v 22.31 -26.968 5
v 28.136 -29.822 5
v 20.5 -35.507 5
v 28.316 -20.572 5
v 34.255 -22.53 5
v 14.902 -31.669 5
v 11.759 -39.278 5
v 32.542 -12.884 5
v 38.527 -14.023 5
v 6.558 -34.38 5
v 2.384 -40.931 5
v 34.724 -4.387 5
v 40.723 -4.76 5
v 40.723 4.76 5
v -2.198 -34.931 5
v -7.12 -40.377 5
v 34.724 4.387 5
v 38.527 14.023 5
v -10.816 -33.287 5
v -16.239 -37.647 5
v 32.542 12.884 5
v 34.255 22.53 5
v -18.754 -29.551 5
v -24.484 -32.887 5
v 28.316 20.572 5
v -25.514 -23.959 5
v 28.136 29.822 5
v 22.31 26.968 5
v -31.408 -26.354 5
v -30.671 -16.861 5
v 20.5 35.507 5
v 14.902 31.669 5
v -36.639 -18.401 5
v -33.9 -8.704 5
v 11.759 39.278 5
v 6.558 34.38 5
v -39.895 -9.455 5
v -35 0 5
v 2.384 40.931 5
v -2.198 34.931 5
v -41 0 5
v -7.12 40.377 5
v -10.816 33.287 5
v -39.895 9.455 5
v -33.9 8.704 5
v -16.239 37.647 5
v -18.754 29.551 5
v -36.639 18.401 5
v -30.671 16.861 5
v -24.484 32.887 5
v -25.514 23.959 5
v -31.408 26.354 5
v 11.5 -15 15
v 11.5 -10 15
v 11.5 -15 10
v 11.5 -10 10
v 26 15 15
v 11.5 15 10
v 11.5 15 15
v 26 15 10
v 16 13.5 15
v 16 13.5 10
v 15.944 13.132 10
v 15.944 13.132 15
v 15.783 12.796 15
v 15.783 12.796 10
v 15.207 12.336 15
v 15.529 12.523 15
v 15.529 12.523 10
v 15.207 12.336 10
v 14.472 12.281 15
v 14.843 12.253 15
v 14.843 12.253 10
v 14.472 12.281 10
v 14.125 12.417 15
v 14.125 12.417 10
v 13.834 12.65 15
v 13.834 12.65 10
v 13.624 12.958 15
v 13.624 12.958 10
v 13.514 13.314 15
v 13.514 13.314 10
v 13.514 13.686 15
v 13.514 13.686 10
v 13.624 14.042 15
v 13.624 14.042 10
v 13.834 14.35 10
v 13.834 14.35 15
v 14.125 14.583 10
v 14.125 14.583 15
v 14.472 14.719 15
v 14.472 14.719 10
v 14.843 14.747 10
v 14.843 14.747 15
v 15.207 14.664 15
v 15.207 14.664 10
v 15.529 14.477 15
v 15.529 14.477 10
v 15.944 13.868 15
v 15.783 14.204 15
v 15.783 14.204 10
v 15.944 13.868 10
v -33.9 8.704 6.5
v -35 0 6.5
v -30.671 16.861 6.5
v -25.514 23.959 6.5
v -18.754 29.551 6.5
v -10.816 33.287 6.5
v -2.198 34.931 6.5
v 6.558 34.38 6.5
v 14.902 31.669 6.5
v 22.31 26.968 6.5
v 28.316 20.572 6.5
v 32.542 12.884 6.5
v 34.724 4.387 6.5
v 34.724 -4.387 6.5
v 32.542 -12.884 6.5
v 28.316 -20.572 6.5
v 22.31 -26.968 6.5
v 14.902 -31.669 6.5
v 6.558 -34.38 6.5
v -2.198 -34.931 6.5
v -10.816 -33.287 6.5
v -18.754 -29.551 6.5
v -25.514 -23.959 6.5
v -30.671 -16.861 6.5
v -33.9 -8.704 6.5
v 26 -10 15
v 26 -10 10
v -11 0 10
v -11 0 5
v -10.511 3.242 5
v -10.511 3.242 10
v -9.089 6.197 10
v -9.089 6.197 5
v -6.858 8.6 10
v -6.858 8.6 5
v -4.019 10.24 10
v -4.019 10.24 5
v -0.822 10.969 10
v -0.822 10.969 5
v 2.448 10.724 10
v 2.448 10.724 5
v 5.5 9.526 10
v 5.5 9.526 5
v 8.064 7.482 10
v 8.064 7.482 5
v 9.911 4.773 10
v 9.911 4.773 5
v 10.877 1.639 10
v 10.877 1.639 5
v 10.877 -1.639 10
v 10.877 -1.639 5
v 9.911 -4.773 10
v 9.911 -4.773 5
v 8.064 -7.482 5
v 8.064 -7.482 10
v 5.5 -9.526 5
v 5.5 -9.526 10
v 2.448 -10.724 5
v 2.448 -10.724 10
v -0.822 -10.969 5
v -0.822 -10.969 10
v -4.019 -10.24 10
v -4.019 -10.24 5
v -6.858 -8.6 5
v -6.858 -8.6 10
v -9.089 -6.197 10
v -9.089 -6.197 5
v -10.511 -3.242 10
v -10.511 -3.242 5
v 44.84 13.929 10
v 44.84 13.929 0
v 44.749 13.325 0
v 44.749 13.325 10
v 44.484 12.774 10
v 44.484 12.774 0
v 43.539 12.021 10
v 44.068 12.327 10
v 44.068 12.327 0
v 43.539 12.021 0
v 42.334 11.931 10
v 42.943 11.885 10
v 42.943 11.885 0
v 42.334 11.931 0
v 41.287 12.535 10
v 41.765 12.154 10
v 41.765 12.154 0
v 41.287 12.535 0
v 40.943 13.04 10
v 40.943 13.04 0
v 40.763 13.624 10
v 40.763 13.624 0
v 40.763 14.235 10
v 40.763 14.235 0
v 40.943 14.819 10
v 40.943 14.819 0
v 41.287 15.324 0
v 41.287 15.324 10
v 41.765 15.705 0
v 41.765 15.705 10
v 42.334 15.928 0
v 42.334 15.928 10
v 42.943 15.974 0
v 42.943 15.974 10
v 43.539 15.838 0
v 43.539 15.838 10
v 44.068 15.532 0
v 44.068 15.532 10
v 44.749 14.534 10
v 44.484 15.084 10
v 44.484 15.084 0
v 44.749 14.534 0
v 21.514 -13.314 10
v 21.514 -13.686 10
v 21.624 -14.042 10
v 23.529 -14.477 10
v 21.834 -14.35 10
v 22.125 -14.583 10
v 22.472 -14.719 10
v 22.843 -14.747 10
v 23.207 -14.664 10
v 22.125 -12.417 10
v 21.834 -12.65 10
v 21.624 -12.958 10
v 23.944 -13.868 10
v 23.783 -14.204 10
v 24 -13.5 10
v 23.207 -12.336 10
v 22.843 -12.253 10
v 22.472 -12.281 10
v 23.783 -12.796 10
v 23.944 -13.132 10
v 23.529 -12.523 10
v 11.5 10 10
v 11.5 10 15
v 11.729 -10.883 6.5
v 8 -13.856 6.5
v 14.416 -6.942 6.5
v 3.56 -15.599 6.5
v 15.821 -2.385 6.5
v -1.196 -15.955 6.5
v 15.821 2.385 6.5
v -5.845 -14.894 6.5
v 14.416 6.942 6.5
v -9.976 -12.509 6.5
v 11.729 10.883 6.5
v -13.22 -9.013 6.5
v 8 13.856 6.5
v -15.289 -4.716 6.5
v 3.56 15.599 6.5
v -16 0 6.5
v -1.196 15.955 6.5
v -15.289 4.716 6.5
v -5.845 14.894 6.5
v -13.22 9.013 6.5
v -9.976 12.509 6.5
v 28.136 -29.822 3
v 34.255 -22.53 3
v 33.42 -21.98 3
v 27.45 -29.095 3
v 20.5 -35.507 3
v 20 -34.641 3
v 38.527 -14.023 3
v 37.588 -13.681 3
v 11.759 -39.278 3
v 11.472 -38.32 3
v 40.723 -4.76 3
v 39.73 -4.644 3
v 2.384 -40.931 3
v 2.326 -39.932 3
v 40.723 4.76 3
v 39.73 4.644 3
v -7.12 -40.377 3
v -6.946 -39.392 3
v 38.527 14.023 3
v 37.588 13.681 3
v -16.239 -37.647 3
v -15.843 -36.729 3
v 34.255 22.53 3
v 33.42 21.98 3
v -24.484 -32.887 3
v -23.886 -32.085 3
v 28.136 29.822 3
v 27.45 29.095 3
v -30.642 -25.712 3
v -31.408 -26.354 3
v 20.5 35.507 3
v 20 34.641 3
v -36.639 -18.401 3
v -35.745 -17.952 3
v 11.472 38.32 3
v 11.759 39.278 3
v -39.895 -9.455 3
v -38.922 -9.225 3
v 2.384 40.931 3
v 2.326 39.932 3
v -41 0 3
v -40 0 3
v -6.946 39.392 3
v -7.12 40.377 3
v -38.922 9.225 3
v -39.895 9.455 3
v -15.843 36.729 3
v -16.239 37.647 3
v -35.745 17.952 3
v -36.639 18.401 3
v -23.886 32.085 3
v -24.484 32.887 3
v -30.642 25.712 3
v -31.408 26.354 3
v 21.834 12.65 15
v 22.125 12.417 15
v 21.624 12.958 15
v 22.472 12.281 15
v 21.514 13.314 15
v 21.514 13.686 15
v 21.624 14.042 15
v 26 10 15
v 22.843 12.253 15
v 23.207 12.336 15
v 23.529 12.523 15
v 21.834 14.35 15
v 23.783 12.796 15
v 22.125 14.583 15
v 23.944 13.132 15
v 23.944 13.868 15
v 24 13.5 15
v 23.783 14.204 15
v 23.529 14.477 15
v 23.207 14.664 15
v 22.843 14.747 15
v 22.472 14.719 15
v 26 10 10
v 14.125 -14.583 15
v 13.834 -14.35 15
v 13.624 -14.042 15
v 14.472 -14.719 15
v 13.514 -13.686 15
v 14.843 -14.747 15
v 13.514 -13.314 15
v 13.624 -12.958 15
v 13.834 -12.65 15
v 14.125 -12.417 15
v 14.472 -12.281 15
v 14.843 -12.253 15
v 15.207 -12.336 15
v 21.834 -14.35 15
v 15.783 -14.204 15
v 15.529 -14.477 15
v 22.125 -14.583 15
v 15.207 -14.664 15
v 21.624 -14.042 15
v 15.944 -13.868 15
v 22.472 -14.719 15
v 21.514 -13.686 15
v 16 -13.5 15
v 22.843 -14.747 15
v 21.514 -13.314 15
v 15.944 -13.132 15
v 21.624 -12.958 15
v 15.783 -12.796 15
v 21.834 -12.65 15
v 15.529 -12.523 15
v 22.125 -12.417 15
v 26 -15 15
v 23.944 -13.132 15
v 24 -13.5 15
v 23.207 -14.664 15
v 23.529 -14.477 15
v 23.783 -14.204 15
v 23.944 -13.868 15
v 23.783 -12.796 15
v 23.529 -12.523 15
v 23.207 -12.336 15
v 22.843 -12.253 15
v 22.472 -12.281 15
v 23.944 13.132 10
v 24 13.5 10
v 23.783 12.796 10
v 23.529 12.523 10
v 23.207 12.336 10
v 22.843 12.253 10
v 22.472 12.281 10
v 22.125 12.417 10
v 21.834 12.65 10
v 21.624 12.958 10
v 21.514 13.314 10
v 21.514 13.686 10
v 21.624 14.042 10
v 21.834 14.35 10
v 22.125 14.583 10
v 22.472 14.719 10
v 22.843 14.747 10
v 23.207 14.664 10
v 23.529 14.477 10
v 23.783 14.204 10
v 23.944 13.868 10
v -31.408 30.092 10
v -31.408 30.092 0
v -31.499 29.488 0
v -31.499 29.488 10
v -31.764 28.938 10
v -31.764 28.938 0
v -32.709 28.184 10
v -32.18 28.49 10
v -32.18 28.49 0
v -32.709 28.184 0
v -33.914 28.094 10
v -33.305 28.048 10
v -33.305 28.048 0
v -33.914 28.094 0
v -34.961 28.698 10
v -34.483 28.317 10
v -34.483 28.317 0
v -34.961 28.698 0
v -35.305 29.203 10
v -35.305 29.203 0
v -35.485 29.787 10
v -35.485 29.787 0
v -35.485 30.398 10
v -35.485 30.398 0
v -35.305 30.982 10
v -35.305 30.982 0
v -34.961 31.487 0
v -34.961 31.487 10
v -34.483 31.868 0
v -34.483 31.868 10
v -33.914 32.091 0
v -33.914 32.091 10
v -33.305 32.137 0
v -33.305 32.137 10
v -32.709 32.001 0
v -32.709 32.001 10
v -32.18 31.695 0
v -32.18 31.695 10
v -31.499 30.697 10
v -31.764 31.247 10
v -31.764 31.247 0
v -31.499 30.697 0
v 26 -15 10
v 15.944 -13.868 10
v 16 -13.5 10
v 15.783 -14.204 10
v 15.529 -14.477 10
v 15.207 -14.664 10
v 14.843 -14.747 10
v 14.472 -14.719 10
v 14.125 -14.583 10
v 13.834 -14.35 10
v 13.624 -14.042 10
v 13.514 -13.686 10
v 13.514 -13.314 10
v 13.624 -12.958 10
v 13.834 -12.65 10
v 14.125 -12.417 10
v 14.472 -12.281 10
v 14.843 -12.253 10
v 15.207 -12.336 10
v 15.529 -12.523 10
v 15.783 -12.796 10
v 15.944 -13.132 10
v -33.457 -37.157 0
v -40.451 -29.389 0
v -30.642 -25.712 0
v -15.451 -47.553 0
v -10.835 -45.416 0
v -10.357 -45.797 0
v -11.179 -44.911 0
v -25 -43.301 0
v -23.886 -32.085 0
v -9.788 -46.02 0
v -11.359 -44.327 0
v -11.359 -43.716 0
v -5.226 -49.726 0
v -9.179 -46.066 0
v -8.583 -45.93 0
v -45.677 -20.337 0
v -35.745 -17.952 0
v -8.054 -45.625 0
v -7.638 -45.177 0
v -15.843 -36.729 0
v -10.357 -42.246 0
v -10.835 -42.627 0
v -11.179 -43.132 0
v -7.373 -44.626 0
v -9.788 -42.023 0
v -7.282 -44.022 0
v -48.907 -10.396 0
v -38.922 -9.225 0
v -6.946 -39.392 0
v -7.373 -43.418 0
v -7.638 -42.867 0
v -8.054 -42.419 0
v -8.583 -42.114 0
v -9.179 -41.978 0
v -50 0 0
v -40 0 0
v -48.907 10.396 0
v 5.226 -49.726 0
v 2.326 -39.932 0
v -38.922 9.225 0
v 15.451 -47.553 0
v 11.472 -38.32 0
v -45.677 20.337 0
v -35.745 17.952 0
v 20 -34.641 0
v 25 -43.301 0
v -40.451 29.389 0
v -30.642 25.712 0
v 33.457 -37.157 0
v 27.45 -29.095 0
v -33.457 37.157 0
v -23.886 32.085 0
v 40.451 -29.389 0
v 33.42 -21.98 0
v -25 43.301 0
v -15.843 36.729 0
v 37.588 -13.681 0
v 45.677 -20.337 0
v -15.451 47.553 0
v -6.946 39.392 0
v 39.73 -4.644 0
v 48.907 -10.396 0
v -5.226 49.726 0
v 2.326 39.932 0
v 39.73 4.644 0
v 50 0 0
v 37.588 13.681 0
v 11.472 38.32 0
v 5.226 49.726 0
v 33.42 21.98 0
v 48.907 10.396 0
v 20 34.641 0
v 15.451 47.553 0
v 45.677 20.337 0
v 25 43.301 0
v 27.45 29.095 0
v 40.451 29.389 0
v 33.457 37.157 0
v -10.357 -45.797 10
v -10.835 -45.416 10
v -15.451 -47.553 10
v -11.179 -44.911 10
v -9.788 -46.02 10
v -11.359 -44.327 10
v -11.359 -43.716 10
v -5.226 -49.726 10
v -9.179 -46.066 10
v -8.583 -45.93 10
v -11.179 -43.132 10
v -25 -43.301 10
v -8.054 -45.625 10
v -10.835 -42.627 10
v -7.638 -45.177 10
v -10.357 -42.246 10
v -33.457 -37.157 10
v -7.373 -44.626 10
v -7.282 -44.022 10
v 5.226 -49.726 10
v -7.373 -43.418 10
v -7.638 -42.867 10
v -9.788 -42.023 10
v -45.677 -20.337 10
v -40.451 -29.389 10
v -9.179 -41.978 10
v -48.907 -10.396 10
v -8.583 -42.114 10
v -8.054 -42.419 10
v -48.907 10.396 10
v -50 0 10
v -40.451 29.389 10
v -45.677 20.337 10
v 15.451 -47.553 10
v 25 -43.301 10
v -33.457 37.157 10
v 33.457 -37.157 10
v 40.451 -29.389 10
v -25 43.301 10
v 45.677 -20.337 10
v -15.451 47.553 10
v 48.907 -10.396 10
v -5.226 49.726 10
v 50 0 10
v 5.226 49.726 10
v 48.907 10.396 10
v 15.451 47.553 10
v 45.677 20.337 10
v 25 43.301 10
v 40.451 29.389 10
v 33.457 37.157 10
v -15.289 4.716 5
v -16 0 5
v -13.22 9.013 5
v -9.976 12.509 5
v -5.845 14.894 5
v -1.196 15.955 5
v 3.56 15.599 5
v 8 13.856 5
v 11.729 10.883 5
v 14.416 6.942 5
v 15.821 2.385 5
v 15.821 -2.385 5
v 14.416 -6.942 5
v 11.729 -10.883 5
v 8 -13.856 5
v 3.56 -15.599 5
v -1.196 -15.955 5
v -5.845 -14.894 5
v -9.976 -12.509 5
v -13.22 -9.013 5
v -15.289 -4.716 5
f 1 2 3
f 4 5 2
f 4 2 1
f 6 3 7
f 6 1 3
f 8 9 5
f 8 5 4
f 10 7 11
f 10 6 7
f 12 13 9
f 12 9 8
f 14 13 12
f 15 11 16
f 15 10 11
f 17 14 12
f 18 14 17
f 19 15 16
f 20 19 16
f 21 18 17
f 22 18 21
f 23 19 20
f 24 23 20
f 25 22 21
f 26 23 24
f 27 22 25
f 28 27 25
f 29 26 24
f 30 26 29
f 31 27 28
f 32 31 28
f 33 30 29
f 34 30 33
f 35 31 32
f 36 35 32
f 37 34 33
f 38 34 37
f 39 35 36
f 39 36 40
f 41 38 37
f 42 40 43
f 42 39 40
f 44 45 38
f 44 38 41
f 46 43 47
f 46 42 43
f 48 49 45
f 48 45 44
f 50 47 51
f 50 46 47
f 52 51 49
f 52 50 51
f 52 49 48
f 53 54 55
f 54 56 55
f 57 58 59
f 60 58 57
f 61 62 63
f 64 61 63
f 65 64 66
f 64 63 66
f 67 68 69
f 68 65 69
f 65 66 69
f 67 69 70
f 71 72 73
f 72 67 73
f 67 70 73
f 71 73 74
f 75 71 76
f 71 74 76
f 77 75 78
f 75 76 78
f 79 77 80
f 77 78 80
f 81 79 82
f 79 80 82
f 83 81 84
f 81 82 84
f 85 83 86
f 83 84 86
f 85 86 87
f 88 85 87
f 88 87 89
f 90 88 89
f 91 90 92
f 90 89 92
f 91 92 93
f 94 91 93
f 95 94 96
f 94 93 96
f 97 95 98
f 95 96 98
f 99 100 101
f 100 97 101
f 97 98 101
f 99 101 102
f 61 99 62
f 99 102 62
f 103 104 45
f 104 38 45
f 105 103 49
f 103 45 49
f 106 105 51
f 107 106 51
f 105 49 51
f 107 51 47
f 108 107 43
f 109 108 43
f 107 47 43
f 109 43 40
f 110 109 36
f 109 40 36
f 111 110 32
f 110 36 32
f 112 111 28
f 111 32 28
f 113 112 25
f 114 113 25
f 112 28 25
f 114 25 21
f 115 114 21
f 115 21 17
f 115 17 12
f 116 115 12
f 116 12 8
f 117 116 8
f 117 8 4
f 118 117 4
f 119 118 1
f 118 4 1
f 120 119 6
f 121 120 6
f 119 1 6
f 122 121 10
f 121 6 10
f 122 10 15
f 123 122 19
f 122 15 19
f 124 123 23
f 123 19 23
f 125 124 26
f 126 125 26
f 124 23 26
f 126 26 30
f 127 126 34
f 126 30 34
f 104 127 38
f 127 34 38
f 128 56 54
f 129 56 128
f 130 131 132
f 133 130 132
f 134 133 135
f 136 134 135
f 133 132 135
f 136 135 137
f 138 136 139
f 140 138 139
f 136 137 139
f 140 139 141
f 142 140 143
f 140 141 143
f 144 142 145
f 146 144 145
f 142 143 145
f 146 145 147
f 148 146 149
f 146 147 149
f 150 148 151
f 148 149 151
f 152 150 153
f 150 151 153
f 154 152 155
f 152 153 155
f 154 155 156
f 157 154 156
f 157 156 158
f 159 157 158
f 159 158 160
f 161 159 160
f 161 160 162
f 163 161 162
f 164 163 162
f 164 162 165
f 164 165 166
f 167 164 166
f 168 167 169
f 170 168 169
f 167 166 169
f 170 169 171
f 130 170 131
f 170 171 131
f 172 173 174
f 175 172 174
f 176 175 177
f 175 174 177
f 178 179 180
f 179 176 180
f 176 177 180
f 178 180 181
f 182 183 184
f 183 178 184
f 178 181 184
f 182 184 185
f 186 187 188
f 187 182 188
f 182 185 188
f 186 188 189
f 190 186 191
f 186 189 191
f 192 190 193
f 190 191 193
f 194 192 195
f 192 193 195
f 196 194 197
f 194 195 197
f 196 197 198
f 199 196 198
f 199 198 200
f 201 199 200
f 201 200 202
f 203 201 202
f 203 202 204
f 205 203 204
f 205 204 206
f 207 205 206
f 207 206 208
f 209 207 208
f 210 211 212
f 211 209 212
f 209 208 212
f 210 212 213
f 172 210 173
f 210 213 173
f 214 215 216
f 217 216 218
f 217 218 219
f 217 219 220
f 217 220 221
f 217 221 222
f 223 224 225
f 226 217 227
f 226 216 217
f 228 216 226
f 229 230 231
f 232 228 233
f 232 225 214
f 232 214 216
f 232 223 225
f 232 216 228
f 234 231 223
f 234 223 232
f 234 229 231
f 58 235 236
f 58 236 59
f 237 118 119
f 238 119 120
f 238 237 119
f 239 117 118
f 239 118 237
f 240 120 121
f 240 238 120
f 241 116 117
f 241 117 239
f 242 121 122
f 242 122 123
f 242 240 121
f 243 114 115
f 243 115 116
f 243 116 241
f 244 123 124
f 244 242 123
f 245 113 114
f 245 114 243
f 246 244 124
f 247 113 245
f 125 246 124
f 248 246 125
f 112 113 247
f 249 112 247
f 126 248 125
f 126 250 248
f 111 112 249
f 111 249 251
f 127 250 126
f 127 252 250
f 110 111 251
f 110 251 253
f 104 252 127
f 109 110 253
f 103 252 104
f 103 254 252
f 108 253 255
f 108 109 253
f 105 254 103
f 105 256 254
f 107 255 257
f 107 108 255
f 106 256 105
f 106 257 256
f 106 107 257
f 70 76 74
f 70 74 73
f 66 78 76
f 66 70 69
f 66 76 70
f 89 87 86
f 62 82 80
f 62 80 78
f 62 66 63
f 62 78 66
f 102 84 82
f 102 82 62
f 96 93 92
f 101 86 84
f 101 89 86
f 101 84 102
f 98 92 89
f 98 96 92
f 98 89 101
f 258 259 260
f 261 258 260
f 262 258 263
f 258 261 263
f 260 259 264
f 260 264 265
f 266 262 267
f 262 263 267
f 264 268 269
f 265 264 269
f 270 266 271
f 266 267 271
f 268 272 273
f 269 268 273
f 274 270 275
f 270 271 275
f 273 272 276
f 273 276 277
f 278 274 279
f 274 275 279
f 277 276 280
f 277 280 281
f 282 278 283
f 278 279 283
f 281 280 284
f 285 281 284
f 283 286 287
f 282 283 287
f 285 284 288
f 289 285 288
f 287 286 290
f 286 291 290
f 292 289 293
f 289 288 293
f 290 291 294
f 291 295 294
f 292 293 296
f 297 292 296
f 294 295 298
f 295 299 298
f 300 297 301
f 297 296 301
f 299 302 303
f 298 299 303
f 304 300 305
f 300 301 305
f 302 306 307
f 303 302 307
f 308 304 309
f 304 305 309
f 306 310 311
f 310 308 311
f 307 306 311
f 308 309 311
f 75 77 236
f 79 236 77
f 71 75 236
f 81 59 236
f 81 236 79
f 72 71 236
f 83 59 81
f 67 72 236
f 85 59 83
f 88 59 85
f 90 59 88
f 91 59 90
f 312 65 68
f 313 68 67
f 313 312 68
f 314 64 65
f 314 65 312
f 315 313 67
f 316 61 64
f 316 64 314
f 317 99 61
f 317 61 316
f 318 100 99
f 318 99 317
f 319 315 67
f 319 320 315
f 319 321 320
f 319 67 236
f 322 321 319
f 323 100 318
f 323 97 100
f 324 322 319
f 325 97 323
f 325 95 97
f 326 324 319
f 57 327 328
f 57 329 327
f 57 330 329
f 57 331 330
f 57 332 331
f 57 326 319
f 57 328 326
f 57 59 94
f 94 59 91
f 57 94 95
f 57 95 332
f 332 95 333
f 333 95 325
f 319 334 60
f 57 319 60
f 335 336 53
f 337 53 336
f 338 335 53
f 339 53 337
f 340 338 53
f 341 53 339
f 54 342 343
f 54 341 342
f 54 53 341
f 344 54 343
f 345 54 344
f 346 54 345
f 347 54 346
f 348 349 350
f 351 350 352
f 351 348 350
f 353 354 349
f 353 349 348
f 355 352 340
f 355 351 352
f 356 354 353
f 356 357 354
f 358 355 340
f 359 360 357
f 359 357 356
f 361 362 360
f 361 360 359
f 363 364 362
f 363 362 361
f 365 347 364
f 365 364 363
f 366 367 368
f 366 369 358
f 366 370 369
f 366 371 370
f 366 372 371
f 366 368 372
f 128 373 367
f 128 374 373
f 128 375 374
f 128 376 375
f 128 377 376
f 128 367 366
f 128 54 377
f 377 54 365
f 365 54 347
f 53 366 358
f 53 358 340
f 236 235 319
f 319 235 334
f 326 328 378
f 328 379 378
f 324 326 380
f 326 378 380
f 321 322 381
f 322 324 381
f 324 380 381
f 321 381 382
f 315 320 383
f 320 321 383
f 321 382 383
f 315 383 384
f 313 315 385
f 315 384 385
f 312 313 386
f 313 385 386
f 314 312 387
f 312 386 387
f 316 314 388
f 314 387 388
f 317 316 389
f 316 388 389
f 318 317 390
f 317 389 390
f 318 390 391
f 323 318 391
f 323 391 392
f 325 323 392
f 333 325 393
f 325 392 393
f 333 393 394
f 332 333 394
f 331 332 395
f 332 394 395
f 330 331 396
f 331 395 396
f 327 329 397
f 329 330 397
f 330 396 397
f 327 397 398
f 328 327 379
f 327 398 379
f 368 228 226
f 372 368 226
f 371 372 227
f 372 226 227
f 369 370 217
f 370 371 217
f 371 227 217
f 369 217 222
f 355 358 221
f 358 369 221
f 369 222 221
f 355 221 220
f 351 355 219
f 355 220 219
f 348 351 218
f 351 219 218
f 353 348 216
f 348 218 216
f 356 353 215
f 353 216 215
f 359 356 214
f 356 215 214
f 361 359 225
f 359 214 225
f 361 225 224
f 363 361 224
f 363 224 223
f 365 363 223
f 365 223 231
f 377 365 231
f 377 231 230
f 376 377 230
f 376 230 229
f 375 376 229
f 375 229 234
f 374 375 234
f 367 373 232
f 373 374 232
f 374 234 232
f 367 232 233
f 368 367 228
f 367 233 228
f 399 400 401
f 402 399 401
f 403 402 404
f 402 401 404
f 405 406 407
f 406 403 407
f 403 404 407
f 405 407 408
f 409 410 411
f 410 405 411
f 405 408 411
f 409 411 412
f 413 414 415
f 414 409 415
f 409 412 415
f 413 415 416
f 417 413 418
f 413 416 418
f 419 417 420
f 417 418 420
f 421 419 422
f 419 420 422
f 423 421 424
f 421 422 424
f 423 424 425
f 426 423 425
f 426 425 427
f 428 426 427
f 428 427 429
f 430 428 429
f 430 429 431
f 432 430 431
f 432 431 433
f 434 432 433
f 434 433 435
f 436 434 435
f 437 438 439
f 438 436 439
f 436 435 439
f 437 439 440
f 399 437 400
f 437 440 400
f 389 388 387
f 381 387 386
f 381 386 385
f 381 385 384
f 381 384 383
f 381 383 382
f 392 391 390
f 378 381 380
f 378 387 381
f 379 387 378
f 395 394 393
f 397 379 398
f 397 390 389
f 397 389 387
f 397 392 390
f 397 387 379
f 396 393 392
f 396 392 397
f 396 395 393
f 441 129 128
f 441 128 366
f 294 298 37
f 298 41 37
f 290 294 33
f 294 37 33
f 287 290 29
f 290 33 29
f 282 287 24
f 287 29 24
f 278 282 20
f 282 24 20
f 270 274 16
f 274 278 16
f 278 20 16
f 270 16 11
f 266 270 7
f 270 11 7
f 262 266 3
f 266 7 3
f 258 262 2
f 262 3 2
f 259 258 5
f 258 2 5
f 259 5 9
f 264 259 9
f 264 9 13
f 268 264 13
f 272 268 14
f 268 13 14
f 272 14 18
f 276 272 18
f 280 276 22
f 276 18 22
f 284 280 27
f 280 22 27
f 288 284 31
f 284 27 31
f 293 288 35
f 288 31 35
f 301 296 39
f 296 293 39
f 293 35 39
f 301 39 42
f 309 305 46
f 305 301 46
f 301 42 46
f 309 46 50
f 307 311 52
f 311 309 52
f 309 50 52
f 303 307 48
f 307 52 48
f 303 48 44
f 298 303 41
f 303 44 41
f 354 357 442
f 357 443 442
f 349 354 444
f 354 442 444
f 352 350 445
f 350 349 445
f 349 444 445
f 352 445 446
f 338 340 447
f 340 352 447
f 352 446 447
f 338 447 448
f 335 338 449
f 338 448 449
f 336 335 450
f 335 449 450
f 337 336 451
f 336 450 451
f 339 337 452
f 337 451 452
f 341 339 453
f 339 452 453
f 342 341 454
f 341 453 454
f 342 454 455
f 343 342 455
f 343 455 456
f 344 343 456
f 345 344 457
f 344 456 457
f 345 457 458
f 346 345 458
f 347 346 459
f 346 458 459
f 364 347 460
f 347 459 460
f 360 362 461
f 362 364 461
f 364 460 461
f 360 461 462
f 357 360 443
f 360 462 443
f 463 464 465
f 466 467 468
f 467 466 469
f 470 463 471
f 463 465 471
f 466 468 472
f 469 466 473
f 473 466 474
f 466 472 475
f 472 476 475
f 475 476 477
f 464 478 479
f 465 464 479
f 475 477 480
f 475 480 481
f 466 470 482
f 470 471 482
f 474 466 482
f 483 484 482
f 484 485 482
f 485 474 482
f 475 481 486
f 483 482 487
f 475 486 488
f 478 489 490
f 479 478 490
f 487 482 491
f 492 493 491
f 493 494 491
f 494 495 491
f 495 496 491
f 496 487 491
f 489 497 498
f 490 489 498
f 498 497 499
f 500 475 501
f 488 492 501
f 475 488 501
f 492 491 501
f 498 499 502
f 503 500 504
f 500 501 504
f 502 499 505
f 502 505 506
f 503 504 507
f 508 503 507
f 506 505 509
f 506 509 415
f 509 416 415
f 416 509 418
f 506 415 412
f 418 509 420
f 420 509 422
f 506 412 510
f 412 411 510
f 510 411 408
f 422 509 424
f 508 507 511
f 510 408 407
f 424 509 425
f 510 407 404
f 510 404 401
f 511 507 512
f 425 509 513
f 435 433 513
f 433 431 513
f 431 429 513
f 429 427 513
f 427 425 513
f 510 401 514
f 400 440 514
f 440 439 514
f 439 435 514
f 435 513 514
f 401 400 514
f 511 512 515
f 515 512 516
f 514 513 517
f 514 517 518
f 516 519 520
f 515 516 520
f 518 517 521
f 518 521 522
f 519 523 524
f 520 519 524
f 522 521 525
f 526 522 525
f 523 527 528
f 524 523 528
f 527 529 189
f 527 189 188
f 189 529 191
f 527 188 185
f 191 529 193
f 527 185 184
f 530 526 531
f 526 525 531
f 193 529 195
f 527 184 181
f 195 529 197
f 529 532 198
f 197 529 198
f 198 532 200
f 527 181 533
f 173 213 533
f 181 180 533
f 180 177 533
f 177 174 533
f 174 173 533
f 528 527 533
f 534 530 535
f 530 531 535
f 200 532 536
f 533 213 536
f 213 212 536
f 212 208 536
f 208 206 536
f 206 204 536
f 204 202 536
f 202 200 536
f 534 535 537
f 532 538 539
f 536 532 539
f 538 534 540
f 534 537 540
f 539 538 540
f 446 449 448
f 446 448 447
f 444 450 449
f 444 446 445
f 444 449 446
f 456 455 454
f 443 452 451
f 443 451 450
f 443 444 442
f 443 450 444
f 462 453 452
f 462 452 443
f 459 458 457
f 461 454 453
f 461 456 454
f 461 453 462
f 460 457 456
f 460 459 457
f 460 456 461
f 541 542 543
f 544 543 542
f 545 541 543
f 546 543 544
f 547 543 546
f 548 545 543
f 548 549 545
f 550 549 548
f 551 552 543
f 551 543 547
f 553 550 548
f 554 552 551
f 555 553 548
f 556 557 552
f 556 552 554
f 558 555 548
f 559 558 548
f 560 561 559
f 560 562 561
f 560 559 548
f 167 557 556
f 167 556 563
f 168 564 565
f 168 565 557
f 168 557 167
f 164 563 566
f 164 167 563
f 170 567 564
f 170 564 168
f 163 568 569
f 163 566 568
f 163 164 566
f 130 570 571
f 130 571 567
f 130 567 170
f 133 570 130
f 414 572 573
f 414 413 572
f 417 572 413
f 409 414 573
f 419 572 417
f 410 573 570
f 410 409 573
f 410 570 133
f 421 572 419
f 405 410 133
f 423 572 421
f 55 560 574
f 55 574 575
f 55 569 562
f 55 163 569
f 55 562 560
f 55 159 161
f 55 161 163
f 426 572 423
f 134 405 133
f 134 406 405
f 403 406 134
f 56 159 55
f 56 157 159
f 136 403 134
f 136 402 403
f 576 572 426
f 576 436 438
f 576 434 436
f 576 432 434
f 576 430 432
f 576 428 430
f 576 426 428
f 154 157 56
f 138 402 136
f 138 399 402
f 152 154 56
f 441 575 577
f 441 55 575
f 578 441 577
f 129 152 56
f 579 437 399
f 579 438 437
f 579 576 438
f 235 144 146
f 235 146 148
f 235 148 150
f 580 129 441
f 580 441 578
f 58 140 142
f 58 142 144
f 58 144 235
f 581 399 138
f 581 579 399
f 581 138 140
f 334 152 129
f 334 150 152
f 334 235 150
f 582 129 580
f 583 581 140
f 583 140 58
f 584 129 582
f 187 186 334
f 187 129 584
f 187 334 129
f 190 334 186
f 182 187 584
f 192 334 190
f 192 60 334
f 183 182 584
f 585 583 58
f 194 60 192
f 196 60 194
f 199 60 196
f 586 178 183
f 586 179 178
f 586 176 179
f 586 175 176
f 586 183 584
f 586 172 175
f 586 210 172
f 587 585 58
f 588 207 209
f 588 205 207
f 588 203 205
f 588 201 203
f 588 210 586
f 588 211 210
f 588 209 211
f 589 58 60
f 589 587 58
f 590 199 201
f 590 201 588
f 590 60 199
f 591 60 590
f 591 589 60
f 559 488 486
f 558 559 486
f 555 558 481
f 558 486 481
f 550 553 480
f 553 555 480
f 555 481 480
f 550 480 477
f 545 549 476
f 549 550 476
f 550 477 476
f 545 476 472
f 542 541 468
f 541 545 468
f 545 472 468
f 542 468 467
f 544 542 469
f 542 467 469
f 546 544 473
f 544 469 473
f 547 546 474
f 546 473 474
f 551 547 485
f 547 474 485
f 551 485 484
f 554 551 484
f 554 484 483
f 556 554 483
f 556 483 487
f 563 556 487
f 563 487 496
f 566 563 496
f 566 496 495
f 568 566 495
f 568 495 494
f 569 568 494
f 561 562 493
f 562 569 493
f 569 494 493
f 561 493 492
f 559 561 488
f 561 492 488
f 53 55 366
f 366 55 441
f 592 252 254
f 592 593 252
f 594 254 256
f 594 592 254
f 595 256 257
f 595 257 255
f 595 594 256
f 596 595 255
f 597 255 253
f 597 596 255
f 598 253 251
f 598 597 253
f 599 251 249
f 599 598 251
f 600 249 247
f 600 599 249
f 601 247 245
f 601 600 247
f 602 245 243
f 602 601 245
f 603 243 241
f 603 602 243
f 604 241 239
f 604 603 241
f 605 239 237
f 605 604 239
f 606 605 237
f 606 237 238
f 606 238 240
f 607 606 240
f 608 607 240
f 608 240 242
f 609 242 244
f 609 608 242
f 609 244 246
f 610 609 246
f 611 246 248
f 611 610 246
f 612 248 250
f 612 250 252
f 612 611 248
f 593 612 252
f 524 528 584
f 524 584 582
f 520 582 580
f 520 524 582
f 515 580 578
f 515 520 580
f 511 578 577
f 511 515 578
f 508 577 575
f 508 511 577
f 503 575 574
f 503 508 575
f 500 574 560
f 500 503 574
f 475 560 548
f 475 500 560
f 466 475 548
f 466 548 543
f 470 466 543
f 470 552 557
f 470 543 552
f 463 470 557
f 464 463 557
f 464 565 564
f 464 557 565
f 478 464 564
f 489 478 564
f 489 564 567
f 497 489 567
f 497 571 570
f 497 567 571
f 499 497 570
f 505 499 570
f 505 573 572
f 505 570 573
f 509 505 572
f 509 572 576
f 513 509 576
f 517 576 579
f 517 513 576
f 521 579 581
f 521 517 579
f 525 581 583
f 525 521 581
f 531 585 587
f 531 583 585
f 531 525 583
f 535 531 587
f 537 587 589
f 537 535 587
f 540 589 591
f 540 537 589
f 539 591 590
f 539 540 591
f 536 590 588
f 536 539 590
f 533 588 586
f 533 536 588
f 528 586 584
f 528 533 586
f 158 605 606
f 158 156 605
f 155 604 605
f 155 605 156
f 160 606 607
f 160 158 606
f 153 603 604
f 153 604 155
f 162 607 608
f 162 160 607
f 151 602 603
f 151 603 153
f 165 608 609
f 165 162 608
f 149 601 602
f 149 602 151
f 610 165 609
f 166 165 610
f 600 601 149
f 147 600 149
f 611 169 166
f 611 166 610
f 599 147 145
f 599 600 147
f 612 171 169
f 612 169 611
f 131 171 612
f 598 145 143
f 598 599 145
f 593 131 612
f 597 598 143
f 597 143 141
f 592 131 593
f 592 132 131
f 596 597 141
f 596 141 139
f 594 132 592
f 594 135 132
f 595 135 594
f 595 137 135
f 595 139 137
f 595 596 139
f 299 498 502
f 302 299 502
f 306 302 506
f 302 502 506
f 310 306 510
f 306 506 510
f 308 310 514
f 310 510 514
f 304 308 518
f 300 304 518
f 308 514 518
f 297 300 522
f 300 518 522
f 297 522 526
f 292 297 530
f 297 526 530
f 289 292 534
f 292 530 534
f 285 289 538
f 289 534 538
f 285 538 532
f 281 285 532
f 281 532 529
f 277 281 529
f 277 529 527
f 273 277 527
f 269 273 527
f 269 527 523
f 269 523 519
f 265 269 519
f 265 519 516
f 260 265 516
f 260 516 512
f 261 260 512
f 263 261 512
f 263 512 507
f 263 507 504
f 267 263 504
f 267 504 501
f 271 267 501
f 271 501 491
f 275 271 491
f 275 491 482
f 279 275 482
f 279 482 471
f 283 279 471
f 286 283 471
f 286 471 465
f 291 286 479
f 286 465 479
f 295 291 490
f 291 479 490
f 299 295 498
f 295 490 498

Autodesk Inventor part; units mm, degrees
ref_plane "YZ Plane" through (0, 0, 0) normal (1, 0, 0) x (0, 1, 0)
ref_plane "XZ Plane" through (0, 0, 0) normal (0, 1, 0) x (-1, 0, 0)
ref_plane "XY Plane" through (0, 0, 0) normal (0, 0, 1) x (1, 0, 0)
sketch "スケッチ1" plane through (0, 0, 0) normal (0, 0, 1) x (1, 0, 0)
  circle A0 centre (0, 0) radius 50
  circle A1 centre (0, 0) radius 40
  circle A2 centre (-33.4581, 30.0925) radius 2.05
  circle A3 centre (-9.3318, -44.0218) radius 2.05
  circle A4 centre (42.7899, 13.9293) radius 2.05
  dimension "d0" = 100
  dimension "d1" = 80
  dimension "d2" = 4.1
  dimension "d4" = 45
  dimension "d7" = 360
extrude "押し出し1" add sketch "スケッチ1" along normal blind 10 contours A0 | A1
sketch "スケッチ2" plane through (0, 0, 0) normal (0, 0, -1) x (-1, 0, 0)
  circle A0 centre (0, 0) radius 50
  circle A1 centre (0, 0) radius 40
  circle A2 centre (-33.4581, 30.0925) radius 2.05
  circle A3 centre (-9.3318, -44.0218) radius 2.05
  circle A4 centre (42.7899, 13.9293) radius 2.05
  dimension "d13" = 100
  dimension "d14" = 80
  dimension "d17" = 360
extrude "押し出し2" cut sketch "スケッチ2" against normal blind 5 contours A1
sketch "スケッチ3" plane through (0, 0, 5) normal (0, 0, -1) x (-1, 0, 0)
  circle A0 centre (0, 0) radius 41
  circle A1 centre (0, 0) radius 40
  dimension "d21" = 80
  dimension "d22" = 82
extrude "押し出し3" cut sketch "スケッチ3" along normal blind 2
sketch "スケッチ4" plane through (0, 0, 5) normal (0, 0, -1) x (-1, 0, 0)
  circle A0 centre (0, 0) radius 35
  circle A1 centre (0, 0) radius 16
  dimension "d27" = 70
  dimension "d28" = 32
extrude "押し出し4" cut sketch "スケッチ4" against normal blind 1.5
sketch "スケッチ5" plane through (0, 0, 5) normal (0, 0, -1) x (-1, 0, 0)
  circle A0 centre (0, 0) radius 11
  dimension "d31" = 22
extrude "押し出し5" cut sketch "スケッチ5" against normal blind 5
sketch "スケッチ8" plane through (0, 0, 10) normal (0, 0, 1) x (1, 0, 0)
  circle A0 centre (0, 0) radius 11
  line L0 (0, 0) -> (3.5, 0)
  line L1 (11.5, 10) -> (11.5, 15)
  line L2 (11.5, 15) -> (26, 15)
  line L3 (11.5, 10) -> (26, 10)
  line L4 (26, 10) -> (26, 15)
  circle A1 centre (14.75, 13.5) radius 1.25
  circle A2 centre (22.75, 13.5) radius 1.25
  line L5 (-70, 0) -> (70, 0)
  line L6 (11.5, -10) -> (11.5, -15)
  line L7 (11.5, -15) -> (26, -15)
  line L8 (11.5, -10) -> (26, -10)
  line L9 (26, -10) -> (26, -15)
  circle A3 centre (14.75, -13.5) radius 1.25
  circle A4 centre (22.75, -13.5) radius 1.25
  line L10 (0, -70) -> (0, 70) projected
  line L11 (-98, 0) -> (98, 0) projected
  dimension "d54" = 5
  dimension "d55" = 14.5
  dimension "d56" = 2.5
  dimension "d57" = 3.25
  dimension "d58" = 1.5
  dimension "d59" = 2.5
  dimension "d60" = 3.25
  dimension "d64" = 27
  dimension "d65" = 11.5
extrude "押し出し7" add sketch "スケッチ8" along normal blind 5 contours L1 L2 L4 L3 | L8 L9 L7 L6
properties part number "rotate_plate_3"
